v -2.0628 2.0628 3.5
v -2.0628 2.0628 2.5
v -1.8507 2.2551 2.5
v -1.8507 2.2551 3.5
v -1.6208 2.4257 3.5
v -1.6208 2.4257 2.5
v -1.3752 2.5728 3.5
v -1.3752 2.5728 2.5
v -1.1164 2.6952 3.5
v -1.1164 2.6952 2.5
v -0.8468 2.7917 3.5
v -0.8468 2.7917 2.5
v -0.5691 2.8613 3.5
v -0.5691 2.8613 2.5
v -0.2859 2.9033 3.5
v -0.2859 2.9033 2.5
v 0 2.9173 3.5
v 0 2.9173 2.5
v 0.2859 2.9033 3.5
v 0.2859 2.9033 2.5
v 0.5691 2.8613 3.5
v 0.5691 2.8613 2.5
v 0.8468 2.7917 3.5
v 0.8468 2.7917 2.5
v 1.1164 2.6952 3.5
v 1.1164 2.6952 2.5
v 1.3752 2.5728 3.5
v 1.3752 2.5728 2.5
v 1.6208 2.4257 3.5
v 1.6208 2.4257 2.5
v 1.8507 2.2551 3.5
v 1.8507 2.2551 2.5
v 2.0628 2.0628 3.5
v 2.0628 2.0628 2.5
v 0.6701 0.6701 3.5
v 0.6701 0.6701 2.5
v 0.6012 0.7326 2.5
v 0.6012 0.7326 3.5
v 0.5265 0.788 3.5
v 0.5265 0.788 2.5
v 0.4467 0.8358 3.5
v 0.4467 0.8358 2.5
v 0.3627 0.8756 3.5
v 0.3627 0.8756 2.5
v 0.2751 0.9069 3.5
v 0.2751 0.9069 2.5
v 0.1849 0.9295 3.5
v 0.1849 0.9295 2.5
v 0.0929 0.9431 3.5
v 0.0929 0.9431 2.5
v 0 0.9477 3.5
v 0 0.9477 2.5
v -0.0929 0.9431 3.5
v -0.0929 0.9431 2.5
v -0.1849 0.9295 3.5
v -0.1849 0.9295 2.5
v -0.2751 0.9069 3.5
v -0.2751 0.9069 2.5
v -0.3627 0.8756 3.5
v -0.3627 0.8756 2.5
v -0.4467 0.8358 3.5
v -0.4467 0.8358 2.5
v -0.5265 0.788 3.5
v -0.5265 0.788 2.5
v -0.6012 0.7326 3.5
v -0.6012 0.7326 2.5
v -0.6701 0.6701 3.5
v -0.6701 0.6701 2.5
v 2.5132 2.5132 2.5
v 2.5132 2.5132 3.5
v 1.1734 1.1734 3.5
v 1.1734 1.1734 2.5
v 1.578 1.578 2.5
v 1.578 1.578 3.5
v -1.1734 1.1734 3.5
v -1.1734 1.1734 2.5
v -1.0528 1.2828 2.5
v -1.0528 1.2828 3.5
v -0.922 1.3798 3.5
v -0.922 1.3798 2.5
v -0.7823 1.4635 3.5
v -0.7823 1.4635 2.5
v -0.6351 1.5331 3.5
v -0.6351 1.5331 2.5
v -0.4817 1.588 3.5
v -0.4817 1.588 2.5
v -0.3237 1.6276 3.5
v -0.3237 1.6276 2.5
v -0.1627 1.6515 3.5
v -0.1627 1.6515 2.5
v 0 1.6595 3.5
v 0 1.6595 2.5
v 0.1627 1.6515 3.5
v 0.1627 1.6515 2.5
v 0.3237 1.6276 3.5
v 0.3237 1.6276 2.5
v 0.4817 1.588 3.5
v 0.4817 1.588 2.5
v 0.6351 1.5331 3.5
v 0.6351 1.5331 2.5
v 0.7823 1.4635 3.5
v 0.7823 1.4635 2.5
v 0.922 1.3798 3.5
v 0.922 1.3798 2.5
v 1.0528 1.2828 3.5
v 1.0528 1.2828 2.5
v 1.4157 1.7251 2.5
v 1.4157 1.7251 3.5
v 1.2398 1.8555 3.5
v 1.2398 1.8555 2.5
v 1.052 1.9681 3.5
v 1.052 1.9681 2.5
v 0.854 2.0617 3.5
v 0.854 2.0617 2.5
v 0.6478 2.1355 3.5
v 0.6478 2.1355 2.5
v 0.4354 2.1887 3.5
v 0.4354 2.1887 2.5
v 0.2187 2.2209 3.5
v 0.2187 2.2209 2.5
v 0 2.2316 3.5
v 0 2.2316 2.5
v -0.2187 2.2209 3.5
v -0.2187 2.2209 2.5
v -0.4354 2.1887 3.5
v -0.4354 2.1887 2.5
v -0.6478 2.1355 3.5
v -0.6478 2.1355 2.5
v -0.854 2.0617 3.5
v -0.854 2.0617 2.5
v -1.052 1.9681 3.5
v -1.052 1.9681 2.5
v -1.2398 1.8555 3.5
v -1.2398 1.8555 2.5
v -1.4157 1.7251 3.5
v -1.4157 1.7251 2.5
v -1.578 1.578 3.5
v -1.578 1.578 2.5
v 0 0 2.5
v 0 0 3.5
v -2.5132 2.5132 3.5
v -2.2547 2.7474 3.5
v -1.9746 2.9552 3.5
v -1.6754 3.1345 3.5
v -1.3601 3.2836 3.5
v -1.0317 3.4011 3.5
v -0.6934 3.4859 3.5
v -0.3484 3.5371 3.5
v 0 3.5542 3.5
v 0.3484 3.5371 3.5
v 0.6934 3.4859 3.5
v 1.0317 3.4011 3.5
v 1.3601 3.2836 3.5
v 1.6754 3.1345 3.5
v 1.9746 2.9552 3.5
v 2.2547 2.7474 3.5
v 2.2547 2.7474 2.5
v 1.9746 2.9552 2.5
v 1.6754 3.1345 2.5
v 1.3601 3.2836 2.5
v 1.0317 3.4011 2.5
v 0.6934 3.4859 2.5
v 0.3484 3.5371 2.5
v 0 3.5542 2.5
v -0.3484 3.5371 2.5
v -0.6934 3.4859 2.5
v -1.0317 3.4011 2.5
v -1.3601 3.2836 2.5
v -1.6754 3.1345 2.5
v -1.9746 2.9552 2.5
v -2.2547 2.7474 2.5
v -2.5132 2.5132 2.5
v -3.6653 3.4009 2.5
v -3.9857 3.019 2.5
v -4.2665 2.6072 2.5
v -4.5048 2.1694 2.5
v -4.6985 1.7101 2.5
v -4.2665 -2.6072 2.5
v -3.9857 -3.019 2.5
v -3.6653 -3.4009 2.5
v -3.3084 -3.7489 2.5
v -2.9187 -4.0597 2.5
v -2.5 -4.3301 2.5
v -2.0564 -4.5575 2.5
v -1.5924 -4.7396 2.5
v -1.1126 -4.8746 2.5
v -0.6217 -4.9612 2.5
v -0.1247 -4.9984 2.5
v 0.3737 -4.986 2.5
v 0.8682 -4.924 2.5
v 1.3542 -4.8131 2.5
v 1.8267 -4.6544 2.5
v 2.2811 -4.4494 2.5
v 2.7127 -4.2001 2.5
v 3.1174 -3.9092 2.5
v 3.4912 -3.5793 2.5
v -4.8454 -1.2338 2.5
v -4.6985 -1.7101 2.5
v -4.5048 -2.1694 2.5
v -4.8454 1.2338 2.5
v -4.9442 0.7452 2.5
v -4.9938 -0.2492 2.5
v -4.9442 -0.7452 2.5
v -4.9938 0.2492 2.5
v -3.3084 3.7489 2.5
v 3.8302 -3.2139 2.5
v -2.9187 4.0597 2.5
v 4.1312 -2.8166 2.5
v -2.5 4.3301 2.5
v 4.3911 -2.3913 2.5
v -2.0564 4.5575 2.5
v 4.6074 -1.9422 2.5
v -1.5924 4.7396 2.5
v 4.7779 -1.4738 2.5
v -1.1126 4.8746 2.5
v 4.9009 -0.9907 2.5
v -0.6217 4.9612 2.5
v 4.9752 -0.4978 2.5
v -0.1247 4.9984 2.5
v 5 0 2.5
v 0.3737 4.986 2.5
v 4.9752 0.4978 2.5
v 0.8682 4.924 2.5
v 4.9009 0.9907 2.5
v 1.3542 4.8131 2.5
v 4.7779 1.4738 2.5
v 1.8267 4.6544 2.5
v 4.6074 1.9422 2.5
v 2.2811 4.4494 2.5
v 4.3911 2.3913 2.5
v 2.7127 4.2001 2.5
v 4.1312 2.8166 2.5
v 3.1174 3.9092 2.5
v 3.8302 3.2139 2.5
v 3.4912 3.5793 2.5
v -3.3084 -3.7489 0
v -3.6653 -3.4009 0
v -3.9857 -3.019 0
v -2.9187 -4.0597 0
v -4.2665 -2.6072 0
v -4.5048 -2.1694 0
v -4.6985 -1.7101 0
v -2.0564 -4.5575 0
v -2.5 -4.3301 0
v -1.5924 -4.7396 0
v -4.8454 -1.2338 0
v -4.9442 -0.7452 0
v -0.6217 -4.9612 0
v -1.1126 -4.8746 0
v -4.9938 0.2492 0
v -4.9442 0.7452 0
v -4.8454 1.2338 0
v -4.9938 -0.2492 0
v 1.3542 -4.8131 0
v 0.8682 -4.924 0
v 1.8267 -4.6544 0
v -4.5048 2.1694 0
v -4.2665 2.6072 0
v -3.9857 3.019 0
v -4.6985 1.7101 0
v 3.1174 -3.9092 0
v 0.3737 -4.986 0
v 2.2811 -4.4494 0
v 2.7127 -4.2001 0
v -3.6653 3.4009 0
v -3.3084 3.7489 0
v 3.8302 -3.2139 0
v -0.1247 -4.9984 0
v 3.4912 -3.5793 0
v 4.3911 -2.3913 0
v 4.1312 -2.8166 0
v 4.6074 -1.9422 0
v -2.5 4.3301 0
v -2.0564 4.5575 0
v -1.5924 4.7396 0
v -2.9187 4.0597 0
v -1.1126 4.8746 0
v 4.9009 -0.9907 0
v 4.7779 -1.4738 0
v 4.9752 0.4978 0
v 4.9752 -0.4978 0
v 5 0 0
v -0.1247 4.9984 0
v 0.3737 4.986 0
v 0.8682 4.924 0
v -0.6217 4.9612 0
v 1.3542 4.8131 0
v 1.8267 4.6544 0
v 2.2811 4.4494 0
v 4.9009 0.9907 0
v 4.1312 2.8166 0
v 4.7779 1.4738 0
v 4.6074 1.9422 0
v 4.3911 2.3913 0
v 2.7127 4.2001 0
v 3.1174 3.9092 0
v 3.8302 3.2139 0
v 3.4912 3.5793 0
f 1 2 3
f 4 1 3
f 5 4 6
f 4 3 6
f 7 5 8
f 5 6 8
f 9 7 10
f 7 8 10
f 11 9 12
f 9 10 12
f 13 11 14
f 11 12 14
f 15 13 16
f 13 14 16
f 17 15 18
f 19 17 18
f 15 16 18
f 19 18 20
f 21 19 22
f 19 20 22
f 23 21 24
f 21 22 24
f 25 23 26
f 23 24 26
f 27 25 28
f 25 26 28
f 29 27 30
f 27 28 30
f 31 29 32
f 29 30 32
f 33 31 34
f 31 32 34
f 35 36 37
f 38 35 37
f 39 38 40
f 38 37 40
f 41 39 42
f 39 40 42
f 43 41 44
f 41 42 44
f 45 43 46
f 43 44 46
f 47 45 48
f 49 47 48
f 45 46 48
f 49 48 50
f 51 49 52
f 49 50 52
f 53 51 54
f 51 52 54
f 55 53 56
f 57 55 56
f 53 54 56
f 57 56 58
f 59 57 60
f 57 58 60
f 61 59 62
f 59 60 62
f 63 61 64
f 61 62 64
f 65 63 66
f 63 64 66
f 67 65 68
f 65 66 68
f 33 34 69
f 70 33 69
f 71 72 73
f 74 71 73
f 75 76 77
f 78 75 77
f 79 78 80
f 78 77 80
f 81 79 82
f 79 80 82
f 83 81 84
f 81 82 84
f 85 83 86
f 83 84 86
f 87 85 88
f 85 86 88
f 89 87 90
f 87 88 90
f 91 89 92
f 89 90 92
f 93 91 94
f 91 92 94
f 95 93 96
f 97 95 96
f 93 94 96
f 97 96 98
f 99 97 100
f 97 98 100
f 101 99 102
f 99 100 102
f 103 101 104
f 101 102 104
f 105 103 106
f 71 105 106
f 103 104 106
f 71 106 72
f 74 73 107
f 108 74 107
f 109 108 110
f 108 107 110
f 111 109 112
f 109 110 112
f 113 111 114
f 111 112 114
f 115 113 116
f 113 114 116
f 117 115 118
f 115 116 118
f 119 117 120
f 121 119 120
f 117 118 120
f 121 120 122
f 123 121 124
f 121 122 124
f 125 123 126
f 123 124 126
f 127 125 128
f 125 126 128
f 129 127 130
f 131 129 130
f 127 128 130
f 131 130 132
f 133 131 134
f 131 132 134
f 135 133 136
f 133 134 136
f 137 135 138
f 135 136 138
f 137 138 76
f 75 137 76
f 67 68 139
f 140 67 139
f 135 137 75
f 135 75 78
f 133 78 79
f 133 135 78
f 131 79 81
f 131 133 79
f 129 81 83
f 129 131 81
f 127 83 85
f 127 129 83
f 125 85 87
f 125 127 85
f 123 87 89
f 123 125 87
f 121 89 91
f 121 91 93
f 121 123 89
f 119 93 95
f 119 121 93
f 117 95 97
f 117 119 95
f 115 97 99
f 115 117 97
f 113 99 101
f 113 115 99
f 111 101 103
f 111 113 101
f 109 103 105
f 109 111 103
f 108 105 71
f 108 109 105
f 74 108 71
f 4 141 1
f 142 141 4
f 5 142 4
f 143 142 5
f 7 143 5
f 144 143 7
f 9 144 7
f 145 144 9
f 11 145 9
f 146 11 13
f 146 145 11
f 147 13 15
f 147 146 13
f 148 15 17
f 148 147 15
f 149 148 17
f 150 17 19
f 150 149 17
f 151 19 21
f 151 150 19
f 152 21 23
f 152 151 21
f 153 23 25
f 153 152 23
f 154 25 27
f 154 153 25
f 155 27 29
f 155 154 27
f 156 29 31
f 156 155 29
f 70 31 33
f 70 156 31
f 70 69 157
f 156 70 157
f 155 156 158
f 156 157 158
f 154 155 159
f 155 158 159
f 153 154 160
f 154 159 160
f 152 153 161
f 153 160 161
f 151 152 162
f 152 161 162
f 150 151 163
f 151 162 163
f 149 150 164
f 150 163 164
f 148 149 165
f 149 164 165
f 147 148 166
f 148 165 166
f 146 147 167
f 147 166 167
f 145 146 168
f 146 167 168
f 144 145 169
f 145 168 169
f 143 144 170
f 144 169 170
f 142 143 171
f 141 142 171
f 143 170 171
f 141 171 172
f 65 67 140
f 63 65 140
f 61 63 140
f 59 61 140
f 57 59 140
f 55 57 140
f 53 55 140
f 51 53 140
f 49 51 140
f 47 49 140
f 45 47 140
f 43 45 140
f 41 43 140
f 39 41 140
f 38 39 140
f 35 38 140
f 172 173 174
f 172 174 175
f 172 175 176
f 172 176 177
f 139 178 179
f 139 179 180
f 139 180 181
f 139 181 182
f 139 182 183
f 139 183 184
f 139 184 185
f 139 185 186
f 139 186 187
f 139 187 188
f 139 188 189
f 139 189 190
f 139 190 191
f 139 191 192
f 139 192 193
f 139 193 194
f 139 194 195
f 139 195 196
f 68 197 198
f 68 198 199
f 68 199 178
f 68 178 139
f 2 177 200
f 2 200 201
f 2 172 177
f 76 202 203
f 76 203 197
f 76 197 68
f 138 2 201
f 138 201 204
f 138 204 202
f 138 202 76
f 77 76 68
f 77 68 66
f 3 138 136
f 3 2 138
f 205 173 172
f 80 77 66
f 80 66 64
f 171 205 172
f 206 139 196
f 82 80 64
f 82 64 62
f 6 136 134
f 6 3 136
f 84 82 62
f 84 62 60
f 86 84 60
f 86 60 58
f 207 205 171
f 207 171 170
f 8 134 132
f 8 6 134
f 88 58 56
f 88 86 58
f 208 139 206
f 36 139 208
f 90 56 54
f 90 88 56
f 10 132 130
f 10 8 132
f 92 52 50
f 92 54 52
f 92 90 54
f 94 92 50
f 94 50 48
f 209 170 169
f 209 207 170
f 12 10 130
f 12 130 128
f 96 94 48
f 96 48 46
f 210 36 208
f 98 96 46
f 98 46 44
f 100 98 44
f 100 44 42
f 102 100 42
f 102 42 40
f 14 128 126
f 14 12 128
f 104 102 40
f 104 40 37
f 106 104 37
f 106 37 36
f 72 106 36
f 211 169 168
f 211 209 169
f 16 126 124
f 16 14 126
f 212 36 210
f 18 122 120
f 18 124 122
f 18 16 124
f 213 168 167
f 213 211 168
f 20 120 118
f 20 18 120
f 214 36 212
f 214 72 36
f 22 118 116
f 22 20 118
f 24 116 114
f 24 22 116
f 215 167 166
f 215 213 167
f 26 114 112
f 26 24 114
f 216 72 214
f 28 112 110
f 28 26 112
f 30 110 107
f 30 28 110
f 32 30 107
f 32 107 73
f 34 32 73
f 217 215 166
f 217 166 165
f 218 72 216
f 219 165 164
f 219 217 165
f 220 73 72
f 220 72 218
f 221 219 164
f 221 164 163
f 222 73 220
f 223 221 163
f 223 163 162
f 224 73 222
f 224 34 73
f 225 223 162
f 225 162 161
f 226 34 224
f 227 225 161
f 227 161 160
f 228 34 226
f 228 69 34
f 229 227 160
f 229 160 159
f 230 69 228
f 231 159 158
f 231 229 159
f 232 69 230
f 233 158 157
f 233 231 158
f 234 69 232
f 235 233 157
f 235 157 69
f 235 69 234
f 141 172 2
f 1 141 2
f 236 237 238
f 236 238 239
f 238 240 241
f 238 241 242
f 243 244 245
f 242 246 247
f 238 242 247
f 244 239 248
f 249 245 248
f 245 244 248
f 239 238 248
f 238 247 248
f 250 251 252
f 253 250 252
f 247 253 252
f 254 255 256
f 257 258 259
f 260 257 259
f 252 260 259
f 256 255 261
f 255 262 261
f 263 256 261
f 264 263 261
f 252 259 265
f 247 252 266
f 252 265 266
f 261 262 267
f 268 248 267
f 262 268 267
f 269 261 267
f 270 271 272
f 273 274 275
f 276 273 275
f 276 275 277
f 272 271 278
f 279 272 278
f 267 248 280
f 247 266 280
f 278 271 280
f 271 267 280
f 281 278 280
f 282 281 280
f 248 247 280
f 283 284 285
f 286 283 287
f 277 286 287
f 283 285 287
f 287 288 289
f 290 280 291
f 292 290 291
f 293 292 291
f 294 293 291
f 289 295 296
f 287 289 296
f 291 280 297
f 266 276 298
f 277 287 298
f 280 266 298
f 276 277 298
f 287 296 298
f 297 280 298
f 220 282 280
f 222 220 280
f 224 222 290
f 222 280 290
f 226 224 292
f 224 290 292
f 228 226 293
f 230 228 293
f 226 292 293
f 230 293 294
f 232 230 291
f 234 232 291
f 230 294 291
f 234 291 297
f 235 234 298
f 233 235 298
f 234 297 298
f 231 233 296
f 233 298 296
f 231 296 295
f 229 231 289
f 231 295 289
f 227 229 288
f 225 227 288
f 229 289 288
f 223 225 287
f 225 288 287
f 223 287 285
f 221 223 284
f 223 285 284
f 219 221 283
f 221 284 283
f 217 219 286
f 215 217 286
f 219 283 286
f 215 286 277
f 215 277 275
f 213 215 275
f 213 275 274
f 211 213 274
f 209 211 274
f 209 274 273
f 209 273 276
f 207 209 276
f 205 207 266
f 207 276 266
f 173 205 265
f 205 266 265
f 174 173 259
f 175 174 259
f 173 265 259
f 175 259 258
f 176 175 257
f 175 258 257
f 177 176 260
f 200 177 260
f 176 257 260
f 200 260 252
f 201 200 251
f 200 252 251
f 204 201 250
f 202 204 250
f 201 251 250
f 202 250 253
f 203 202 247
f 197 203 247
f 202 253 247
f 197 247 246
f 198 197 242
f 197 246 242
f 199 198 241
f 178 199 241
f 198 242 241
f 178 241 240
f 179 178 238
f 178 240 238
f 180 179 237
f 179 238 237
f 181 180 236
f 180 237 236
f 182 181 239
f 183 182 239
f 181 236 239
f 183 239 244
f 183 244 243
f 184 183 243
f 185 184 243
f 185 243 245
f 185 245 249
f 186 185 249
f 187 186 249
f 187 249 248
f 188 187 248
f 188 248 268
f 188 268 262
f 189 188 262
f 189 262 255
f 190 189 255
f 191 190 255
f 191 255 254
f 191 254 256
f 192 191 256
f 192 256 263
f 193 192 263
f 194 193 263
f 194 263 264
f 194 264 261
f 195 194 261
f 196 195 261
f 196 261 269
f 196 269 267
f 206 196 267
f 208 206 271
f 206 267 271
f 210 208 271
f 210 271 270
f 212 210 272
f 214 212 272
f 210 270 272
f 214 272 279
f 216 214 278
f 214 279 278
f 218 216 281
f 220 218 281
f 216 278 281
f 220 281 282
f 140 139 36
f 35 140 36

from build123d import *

# Parameters (mm, degrees)
F0_R     = 5
F1_DEPTH = 2.5
F3_DEPTH = 1


with BuildPart() as f1:
    # F0 (on Top) → F1 (new body)
    with BuildSketch(Plane.XY):
        Circle(F0_R)
    extrude(amount=F1_DEPTH)

    # F2 (on face) → F3 (join)
    with BuildSketch(Plane.XY.offset(2.5)):
        with BuildLine():
            Line((2.062848, 2.062848), (2.513184, 2.513184))
            ThreePointArc((2.513184, 2.513184), (0, 3.55418), (-2.513184, 2.513184))
            Line((-2.513184, 2.513184), (-2.062848, 2.062848))
            ThreePointArc((-2.062848, 2.062848), (0, 2.917307), (2.062848, 2.062848))
        make_face()
        with BuildLine():
            Line((1.173422, 1.173422), (1.577984, 1.577984))
            ThreePointArc((1.577984, 1.577984), (0, 2.231606), (-1.577984, 1.577984))
            Line((-1.577984, 1.577984), (-1.173422, 1.173422))
            ThreePointArc((-1.173422, 1.173422), (0, 1.659469), (1.173422, 1.173422))
        make_face()
        with BuildLine():
            Line((0, 0), (0.670121, 0.670121))
            ThreePointArc((0.670121, 0.670121), (0, 0.947694), (-0.670121, 0.670121))
            Line((-0.670121, 0.670121), (0, 0))
        make_face()
    extrude(amount=F3_DEPTH)


solid = f1.part
